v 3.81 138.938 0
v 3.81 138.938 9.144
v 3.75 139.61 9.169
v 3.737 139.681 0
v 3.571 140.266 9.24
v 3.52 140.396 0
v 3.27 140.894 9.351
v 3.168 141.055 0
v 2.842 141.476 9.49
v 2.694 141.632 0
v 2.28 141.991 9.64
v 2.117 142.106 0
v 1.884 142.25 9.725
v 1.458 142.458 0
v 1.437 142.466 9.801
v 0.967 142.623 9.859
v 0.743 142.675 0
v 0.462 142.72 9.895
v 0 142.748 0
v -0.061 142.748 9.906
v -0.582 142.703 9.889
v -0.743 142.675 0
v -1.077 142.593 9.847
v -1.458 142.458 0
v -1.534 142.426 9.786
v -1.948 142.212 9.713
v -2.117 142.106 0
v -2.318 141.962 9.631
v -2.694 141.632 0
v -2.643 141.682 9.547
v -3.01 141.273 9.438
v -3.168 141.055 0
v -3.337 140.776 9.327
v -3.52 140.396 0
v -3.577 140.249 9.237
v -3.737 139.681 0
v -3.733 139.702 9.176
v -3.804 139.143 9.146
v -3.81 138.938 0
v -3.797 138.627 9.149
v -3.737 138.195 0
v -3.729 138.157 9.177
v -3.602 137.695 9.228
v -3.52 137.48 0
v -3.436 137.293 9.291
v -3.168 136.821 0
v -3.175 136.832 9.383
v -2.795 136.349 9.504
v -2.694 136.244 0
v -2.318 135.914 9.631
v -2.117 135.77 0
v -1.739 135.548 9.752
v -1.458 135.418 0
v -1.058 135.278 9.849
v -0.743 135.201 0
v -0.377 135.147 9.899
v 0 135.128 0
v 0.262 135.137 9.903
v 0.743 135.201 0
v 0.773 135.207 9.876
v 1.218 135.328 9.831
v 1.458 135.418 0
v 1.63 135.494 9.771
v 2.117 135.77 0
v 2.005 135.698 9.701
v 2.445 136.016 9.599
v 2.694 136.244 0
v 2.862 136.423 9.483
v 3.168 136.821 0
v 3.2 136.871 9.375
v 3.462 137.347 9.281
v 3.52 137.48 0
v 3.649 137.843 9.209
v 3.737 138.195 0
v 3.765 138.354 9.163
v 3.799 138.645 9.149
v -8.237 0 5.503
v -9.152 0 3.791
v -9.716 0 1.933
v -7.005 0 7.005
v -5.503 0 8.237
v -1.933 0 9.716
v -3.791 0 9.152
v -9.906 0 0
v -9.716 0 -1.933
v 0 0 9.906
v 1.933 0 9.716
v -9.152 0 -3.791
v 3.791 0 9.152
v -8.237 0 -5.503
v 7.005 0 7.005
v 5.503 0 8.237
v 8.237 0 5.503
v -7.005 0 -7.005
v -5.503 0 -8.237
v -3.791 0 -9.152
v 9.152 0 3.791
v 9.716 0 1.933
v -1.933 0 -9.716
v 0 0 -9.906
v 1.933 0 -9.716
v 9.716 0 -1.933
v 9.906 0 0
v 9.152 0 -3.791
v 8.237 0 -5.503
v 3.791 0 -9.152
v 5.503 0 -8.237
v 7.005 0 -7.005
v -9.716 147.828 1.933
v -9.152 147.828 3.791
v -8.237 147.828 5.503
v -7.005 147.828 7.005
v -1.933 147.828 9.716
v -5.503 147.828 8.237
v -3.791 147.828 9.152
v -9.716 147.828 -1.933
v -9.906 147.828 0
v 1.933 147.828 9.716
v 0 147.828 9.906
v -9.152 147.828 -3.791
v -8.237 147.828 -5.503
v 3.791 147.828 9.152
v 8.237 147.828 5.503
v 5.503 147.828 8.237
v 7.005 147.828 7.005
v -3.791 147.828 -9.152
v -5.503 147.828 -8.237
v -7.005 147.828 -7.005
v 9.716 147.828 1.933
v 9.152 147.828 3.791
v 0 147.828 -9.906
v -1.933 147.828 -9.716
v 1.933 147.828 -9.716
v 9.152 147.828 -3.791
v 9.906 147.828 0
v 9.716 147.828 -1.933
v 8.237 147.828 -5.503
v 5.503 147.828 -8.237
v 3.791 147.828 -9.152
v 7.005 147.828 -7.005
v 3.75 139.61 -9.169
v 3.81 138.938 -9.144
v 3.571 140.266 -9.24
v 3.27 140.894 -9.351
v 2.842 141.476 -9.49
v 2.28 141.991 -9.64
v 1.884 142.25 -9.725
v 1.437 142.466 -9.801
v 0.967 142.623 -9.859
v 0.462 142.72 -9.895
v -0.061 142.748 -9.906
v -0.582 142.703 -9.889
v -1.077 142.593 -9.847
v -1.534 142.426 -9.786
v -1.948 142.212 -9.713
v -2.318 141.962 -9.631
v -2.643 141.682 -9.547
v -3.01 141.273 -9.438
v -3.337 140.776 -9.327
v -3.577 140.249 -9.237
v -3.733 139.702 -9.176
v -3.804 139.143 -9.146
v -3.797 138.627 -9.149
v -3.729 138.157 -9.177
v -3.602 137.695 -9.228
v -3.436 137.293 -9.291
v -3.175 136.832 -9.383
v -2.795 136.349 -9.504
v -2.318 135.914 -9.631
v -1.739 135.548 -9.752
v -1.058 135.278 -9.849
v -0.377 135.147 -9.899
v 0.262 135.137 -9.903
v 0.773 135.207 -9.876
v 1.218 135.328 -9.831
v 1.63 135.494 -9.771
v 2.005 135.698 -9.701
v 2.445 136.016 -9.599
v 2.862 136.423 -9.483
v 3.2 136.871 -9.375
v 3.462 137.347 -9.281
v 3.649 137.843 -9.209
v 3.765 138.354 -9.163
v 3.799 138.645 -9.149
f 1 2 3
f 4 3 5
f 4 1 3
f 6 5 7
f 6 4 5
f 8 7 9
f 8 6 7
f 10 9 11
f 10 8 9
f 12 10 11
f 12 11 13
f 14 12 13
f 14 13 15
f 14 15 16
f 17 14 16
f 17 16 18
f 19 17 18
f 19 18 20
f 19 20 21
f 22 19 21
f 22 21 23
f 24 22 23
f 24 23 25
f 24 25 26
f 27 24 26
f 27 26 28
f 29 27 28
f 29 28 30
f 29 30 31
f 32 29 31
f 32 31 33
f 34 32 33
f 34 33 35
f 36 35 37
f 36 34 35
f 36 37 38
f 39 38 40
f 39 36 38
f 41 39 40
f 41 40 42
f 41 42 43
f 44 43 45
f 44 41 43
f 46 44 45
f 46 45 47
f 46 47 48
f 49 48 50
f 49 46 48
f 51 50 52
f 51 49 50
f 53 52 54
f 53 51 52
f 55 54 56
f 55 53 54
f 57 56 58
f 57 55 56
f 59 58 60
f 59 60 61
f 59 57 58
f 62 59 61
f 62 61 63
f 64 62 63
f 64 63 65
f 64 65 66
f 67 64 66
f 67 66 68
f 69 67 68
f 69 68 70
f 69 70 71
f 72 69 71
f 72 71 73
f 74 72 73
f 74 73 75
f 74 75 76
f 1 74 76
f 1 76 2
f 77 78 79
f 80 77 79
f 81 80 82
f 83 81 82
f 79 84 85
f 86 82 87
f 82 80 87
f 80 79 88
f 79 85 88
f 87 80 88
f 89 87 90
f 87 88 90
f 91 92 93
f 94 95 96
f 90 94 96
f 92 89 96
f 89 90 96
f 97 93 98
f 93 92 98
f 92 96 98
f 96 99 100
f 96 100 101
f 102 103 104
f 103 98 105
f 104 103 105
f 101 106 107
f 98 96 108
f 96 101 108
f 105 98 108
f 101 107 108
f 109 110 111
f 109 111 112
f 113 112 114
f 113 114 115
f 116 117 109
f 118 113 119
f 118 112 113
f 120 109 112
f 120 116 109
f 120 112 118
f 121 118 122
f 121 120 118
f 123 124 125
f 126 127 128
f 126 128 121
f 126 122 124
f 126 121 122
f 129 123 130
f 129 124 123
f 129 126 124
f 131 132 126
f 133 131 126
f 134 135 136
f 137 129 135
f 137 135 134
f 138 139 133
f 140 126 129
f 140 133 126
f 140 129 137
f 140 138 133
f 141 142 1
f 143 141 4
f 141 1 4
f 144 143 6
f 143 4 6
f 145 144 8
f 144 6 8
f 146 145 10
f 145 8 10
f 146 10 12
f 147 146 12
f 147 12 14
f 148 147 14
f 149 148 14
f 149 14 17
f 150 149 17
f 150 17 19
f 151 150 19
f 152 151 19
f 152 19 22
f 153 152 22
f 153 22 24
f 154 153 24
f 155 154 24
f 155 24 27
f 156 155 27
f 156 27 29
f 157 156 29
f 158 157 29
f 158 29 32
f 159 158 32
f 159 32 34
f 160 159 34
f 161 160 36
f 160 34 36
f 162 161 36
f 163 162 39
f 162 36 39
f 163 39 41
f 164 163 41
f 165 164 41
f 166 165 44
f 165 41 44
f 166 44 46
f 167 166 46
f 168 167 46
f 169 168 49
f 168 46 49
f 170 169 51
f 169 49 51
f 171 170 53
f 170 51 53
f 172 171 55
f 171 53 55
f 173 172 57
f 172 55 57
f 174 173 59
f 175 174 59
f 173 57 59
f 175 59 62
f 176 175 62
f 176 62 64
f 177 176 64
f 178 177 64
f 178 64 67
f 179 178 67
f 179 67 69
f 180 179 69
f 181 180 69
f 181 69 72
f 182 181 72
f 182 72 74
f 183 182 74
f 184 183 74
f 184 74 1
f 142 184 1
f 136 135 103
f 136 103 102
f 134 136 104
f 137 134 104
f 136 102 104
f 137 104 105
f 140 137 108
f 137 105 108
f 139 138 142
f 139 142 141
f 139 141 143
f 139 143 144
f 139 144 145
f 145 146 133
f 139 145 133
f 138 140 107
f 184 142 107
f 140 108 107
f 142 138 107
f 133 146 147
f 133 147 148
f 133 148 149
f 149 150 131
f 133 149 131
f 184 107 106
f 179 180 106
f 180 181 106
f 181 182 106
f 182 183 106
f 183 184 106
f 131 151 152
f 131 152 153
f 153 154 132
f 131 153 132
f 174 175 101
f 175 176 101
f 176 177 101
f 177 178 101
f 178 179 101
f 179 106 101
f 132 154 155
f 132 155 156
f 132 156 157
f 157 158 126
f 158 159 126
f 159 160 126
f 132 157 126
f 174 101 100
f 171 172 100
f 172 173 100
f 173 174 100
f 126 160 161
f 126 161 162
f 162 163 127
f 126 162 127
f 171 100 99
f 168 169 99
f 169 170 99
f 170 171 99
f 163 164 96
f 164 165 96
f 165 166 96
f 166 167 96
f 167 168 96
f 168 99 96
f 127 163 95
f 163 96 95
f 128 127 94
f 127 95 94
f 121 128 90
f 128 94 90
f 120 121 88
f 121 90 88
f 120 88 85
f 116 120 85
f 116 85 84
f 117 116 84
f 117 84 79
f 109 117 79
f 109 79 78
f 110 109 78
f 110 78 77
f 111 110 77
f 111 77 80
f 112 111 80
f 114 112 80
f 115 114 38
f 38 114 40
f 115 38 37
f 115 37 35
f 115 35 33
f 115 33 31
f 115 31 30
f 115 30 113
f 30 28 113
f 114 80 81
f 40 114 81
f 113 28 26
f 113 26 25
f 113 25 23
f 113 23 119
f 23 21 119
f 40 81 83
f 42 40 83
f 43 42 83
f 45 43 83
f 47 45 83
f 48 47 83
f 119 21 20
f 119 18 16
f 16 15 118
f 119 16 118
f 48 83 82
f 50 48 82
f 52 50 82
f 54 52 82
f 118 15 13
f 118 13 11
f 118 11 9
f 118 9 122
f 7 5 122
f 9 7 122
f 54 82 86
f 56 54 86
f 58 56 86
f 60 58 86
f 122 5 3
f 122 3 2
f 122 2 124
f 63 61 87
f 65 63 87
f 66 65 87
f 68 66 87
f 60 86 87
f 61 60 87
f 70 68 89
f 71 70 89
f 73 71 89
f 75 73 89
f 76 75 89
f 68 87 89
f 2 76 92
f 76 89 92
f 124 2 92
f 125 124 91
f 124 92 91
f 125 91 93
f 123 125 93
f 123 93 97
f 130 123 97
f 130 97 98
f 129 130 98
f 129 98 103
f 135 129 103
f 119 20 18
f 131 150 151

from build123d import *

# Parameters (mm, degrees)
SKETCH1_R               = 9.906
BOSS_EXTRUDE1_DEPTH     = 127
SKETCH2_R               = 9.906
BOSS_EXTRUDE2_DEPTH     = 20.828
CUT_EXTRUDE1_DEPTH      = 15.748
CUT_EXTRUDE1_DEPTH_BACK = 15.748
SKETCH3_R               = 3.81


with BuildPart() as part:
    # Sketch1 → Boss-Extrude1 (new body)
    with BuildSketch(Plane(origin=(0, 0, 0), x_dir=(1, 0, 0), z_dir=(0, 1, 0))):
        Circle(SKETCH1_R)
    extrude(amount=BOSS_EXTRUDE1_DEPTH)

    # Sketch2 → Boss-Extrude2 (add)
    with BuildSketch(Plane(origin=(0, 127, 0), x_dir=(1, 0, 0), z_dir=(0, 1, 0))):
        Circle(SKETCH2_R)
    extrude(amount=BOSS_EXTRUDE2_DEPTH)

    # Sketch3 → Cut-Extrude1 (cut, two sides: drawn at the far end of the back side and taken through both)
    with BuildSketch(Plane.XY.offset(-CUT_EXTRUDE1_DEPTH_BACK)):
        with Locations((0, 138.938)):
            Circle(SKETCH3_R)
    extrude(amount=CUT_EXTRUDE1_DEPTH + CUT_EXTRUDE1_DEPTH_BACK, mode=Mode.SUBTRACT)


solid = part.part
